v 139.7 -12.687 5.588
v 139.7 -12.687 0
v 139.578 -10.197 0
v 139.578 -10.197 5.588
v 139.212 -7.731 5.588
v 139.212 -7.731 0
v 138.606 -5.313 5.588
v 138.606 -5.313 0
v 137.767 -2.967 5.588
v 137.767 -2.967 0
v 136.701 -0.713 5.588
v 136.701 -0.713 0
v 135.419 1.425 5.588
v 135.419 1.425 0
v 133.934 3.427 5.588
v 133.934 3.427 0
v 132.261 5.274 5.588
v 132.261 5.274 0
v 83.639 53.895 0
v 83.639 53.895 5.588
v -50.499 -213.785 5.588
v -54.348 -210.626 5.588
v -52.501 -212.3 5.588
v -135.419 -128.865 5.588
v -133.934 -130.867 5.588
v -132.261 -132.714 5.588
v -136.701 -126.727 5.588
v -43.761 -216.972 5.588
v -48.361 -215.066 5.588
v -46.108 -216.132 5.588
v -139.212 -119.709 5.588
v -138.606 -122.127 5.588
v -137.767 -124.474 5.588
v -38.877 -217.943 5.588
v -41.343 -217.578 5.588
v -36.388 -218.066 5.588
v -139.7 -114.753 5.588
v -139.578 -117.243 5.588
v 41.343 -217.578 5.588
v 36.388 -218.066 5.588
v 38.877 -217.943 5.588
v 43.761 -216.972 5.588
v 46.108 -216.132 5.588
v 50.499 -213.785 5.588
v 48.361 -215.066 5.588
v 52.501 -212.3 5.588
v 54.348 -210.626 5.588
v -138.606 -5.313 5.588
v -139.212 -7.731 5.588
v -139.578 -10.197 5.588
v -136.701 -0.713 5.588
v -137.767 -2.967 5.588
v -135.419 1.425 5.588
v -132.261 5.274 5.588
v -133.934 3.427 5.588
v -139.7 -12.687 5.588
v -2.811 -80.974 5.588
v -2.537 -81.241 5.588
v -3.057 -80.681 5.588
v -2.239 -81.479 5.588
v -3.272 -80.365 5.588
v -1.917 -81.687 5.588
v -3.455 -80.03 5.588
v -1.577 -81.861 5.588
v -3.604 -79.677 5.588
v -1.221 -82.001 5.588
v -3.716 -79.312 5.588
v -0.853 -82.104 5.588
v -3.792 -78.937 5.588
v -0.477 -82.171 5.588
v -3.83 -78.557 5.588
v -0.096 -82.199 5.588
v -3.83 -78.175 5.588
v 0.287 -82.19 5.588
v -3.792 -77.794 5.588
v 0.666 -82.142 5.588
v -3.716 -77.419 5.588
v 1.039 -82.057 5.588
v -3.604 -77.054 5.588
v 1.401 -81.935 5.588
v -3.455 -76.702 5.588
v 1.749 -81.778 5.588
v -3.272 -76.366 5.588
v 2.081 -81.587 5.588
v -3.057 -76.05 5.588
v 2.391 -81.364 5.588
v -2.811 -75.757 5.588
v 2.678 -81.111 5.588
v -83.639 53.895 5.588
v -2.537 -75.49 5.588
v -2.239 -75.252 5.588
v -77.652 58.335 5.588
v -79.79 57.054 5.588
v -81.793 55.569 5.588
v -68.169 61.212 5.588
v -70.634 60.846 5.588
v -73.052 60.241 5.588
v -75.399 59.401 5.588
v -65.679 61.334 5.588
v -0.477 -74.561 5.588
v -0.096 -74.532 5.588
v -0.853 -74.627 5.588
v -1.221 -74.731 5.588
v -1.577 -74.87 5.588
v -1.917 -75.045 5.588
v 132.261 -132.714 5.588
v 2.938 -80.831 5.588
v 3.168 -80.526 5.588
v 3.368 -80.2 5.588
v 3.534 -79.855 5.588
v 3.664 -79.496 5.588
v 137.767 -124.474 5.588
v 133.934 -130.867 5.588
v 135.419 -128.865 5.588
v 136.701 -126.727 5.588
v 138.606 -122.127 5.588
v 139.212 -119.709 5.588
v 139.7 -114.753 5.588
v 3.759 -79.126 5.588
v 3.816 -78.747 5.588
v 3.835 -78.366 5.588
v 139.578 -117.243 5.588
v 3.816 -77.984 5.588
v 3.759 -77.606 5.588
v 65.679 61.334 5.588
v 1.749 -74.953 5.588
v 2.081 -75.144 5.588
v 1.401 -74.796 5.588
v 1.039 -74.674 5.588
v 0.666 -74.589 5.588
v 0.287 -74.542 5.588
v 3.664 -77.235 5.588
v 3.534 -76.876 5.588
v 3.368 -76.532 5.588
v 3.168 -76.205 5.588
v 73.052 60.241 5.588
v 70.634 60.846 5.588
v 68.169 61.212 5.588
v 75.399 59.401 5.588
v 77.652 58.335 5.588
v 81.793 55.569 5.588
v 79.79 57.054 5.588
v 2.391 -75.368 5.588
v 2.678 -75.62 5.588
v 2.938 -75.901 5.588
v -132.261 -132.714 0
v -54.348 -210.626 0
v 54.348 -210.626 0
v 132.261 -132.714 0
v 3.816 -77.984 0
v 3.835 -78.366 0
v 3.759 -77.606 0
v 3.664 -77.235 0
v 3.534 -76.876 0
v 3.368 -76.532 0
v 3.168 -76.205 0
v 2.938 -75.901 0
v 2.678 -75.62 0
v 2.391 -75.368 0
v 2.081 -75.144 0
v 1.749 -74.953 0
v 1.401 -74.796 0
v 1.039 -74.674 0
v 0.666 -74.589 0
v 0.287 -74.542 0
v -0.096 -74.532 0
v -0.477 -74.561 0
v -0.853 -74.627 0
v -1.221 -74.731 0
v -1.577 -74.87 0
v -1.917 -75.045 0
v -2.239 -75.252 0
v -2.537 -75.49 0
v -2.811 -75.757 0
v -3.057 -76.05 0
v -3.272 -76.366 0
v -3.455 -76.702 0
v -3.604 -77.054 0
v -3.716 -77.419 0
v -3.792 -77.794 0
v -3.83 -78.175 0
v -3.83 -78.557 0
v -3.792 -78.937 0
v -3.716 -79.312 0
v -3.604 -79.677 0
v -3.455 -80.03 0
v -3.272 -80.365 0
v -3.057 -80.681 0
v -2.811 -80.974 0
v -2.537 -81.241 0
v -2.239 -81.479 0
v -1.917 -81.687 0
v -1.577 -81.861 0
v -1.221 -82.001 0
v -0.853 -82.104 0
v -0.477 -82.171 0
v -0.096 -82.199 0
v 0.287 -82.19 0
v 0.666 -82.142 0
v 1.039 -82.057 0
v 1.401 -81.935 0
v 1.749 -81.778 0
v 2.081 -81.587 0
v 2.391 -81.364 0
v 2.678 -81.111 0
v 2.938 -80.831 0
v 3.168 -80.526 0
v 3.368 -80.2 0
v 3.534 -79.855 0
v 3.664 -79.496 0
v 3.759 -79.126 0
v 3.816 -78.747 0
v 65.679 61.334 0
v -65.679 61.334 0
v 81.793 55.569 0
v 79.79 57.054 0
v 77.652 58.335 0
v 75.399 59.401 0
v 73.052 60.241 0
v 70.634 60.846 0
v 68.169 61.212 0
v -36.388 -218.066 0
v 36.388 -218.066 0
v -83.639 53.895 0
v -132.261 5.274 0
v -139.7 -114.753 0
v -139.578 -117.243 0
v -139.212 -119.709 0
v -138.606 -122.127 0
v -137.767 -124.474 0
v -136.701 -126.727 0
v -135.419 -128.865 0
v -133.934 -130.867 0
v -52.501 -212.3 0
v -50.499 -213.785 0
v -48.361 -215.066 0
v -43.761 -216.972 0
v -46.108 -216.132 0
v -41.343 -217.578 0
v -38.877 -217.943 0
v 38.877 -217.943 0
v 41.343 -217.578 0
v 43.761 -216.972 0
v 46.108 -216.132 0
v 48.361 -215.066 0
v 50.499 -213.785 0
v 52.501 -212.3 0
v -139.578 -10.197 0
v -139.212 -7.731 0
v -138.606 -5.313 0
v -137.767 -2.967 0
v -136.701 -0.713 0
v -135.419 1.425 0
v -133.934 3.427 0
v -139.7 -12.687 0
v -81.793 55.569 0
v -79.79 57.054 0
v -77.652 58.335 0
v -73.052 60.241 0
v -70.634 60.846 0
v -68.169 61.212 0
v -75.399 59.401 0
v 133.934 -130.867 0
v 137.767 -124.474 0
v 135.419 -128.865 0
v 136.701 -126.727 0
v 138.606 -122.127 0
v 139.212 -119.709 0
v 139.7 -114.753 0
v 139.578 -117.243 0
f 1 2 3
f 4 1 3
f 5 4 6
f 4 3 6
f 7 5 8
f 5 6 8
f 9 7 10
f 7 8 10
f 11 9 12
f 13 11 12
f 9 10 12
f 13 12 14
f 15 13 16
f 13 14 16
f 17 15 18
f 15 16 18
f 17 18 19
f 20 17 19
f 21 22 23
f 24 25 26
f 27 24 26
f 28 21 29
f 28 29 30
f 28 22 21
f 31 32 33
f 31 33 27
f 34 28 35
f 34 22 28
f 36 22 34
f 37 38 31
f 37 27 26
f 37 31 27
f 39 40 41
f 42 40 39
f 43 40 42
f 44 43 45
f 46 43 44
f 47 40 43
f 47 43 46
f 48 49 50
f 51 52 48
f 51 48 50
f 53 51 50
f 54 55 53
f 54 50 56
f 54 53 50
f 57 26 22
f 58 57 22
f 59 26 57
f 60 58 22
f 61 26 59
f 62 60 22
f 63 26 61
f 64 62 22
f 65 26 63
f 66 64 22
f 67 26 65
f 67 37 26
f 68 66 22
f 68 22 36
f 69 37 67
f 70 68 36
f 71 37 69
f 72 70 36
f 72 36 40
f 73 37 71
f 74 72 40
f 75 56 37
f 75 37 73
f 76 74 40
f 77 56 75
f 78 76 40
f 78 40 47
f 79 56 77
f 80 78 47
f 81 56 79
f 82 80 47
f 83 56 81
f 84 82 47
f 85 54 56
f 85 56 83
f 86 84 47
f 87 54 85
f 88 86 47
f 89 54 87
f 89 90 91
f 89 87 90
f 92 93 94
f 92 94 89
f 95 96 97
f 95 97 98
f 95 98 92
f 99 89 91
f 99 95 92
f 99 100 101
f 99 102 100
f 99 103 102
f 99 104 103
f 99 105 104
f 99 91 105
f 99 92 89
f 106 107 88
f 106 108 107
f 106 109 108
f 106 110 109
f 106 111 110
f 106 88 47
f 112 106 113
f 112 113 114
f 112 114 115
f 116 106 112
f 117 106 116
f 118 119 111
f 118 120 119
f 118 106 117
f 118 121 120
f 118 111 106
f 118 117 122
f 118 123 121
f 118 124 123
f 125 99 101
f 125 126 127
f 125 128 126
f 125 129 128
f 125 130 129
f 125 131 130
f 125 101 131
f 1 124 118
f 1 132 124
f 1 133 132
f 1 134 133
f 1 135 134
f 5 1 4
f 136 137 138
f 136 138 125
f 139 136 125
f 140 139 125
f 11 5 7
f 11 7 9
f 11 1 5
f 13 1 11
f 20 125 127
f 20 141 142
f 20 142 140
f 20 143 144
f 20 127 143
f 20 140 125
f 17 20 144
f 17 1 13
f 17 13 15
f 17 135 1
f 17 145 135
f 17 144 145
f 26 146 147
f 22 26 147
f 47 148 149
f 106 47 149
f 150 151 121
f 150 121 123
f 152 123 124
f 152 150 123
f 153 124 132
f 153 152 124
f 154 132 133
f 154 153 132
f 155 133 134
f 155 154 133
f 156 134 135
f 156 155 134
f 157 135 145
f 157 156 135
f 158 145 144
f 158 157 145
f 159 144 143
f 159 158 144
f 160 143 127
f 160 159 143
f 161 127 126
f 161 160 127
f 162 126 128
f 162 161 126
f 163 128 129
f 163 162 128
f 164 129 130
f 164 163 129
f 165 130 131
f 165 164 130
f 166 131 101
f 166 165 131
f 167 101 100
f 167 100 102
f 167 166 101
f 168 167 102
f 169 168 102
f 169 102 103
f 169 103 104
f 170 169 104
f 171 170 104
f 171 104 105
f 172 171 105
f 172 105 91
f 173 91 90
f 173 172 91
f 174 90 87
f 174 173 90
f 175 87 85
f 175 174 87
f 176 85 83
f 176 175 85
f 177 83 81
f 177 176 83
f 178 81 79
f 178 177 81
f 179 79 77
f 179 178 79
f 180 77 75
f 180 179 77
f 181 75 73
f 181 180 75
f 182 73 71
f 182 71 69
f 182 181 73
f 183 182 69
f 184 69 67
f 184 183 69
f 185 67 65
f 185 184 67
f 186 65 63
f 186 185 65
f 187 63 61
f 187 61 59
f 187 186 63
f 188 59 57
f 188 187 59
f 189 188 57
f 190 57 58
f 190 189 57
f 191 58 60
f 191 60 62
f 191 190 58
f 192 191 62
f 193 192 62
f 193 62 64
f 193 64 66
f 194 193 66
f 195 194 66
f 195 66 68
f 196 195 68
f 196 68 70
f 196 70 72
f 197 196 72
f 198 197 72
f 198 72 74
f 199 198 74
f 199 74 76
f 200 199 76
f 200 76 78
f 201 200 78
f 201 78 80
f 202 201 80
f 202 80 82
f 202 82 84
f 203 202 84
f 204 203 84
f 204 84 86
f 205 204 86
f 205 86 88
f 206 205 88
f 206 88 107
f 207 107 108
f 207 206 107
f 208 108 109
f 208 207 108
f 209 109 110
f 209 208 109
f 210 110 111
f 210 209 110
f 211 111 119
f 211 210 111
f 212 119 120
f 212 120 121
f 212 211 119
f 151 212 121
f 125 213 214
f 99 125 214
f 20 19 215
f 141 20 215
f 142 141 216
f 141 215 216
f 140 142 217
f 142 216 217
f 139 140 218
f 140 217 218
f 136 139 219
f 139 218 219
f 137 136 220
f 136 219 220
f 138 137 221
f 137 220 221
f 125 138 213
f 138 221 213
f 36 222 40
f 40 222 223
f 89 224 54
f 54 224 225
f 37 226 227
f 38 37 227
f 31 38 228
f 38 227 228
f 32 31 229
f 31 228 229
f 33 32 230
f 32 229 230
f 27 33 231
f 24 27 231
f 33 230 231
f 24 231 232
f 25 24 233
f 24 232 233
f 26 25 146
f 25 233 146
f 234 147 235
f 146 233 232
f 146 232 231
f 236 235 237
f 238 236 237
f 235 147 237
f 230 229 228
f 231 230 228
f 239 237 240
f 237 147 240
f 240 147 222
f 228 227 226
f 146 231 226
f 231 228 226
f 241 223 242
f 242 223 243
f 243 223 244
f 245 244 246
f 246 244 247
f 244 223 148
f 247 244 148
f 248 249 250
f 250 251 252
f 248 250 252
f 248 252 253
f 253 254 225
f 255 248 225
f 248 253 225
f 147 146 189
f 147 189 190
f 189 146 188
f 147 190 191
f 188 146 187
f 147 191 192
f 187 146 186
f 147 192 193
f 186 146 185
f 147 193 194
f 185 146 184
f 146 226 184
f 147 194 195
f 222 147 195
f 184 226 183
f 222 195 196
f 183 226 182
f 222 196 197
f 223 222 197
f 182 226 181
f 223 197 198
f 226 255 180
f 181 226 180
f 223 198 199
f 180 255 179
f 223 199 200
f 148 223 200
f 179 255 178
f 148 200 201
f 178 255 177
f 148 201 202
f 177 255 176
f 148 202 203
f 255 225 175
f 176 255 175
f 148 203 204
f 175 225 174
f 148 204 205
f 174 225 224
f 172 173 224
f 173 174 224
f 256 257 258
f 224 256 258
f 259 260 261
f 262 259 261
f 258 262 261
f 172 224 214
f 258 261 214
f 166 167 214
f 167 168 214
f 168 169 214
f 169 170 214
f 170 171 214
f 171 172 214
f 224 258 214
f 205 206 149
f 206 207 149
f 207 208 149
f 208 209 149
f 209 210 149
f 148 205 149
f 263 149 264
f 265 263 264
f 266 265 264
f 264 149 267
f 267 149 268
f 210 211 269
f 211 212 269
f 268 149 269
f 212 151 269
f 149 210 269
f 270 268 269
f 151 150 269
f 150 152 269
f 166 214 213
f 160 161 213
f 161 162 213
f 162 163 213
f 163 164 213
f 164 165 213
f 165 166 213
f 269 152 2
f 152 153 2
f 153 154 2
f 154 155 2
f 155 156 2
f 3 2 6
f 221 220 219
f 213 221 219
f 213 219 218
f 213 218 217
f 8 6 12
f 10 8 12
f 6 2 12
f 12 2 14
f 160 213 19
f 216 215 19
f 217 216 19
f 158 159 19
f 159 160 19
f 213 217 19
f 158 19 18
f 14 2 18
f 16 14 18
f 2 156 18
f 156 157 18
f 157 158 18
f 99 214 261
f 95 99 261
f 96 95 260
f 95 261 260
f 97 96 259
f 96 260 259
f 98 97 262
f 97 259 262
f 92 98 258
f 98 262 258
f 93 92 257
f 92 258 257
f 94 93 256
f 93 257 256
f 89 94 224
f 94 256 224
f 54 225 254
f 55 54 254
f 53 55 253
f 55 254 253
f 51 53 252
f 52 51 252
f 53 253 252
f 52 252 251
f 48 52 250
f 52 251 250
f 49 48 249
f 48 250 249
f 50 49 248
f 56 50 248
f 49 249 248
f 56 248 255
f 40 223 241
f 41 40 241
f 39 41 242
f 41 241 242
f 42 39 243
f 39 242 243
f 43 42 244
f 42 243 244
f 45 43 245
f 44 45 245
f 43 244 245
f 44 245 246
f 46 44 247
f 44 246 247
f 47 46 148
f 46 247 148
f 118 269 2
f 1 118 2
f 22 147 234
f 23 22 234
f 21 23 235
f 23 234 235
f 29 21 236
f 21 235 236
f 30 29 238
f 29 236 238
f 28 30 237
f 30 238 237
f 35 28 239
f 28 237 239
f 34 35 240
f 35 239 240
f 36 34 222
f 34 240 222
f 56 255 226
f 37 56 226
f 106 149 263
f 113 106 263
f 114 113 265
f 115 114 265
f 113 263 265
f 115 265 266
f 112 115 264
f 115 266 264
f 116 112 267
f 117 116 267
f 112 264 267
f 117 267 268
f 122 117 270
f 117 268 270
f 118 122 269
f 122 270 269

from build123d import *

# Parameters (mm, degrees)
BOSS_EXTRUDE1_DEPTH = 5.588
CAVITY1_OUTLINE_R   = 3.834765
CAVITY1_DEPTH       = 5.588


# Read off the part's stored shape, not the designer's step: Cavity1
with BuildPart() as part:
    # Sketch1 → Boss-Extrude1 (new body)
    with BuildSketch(Plane.XY):
        with BuildLine():
            Line((65.678975516, 61.334336478), (-65.678975516, 61.334336478))
            ThreePointArc((-65.678975516, 61.334336478), (-75.399134698, 59.400876604), (-83.639487758, 53.89484872))
            Line((-83.639487758, 53.89484872), (-132.260512242, 5.273824236))
            ThreePointArc((-132.260512242, 5.273824236), (-137.766540126, -2.966528824), (-139.7, -12.686688006))
            Line((-139.7, -12.686688006), (-139.7, -114.753454114))
            ThreePointArc((-139.7, -114.753454114), (-137.766540126, -124.473613296), (-132.260512242, -132.713966356))
            Line((-132.260512242, -132.713966356), (-54.348302834, -210.626175764))
            ThreePointArc((-54.348302834, -210.626175764), (-46.107949774, -216.132203648), (-36.387790592, -218.065663522))
            Line((-36.387790592, -218.065663522), (36.387790592, -218.065663522))
            ThreePointArc((36.387790592, -218.065663522), (46.107949774, -216.132203648), (54.348302834, -210.626175764))
            Line((54.348302834, -210.626175764), (132.260512242, -132.713966356))
            ThreePointArc((132.260512242, -132.713966356), (137.766540126, -124.473613296), (139.7, -114.753454114))
            Line((139.7, -114.753454114), (139.7, -12.686688006))
            ThreePointArc((139.7, -12.686688006), (137.766540126, -2.966528824), (132.260512242, 5.273824236))
            Line((132.260512242, 5.273824236), (83.639487758, 53.89484872))
            ThreePointArc((83.639487758, 53.89484872), (75.399134698, 59.400876604), (65.678975516, 61.334336478))
        make_face()
    extrude(amount=BOSS_EXTRUDE1_DEPTH)

    # Cavity1 outline → Cavity1 (cut)
    with BuildSketch(Plane.XY):
        with Locations((0, -78.365663522)):
            Circle(CAVITY1_OUTLINE_R)
    extrude(amount=CAVITY1_DEPTH, mode=Mode.SUBTRACT)


solid = part.part
